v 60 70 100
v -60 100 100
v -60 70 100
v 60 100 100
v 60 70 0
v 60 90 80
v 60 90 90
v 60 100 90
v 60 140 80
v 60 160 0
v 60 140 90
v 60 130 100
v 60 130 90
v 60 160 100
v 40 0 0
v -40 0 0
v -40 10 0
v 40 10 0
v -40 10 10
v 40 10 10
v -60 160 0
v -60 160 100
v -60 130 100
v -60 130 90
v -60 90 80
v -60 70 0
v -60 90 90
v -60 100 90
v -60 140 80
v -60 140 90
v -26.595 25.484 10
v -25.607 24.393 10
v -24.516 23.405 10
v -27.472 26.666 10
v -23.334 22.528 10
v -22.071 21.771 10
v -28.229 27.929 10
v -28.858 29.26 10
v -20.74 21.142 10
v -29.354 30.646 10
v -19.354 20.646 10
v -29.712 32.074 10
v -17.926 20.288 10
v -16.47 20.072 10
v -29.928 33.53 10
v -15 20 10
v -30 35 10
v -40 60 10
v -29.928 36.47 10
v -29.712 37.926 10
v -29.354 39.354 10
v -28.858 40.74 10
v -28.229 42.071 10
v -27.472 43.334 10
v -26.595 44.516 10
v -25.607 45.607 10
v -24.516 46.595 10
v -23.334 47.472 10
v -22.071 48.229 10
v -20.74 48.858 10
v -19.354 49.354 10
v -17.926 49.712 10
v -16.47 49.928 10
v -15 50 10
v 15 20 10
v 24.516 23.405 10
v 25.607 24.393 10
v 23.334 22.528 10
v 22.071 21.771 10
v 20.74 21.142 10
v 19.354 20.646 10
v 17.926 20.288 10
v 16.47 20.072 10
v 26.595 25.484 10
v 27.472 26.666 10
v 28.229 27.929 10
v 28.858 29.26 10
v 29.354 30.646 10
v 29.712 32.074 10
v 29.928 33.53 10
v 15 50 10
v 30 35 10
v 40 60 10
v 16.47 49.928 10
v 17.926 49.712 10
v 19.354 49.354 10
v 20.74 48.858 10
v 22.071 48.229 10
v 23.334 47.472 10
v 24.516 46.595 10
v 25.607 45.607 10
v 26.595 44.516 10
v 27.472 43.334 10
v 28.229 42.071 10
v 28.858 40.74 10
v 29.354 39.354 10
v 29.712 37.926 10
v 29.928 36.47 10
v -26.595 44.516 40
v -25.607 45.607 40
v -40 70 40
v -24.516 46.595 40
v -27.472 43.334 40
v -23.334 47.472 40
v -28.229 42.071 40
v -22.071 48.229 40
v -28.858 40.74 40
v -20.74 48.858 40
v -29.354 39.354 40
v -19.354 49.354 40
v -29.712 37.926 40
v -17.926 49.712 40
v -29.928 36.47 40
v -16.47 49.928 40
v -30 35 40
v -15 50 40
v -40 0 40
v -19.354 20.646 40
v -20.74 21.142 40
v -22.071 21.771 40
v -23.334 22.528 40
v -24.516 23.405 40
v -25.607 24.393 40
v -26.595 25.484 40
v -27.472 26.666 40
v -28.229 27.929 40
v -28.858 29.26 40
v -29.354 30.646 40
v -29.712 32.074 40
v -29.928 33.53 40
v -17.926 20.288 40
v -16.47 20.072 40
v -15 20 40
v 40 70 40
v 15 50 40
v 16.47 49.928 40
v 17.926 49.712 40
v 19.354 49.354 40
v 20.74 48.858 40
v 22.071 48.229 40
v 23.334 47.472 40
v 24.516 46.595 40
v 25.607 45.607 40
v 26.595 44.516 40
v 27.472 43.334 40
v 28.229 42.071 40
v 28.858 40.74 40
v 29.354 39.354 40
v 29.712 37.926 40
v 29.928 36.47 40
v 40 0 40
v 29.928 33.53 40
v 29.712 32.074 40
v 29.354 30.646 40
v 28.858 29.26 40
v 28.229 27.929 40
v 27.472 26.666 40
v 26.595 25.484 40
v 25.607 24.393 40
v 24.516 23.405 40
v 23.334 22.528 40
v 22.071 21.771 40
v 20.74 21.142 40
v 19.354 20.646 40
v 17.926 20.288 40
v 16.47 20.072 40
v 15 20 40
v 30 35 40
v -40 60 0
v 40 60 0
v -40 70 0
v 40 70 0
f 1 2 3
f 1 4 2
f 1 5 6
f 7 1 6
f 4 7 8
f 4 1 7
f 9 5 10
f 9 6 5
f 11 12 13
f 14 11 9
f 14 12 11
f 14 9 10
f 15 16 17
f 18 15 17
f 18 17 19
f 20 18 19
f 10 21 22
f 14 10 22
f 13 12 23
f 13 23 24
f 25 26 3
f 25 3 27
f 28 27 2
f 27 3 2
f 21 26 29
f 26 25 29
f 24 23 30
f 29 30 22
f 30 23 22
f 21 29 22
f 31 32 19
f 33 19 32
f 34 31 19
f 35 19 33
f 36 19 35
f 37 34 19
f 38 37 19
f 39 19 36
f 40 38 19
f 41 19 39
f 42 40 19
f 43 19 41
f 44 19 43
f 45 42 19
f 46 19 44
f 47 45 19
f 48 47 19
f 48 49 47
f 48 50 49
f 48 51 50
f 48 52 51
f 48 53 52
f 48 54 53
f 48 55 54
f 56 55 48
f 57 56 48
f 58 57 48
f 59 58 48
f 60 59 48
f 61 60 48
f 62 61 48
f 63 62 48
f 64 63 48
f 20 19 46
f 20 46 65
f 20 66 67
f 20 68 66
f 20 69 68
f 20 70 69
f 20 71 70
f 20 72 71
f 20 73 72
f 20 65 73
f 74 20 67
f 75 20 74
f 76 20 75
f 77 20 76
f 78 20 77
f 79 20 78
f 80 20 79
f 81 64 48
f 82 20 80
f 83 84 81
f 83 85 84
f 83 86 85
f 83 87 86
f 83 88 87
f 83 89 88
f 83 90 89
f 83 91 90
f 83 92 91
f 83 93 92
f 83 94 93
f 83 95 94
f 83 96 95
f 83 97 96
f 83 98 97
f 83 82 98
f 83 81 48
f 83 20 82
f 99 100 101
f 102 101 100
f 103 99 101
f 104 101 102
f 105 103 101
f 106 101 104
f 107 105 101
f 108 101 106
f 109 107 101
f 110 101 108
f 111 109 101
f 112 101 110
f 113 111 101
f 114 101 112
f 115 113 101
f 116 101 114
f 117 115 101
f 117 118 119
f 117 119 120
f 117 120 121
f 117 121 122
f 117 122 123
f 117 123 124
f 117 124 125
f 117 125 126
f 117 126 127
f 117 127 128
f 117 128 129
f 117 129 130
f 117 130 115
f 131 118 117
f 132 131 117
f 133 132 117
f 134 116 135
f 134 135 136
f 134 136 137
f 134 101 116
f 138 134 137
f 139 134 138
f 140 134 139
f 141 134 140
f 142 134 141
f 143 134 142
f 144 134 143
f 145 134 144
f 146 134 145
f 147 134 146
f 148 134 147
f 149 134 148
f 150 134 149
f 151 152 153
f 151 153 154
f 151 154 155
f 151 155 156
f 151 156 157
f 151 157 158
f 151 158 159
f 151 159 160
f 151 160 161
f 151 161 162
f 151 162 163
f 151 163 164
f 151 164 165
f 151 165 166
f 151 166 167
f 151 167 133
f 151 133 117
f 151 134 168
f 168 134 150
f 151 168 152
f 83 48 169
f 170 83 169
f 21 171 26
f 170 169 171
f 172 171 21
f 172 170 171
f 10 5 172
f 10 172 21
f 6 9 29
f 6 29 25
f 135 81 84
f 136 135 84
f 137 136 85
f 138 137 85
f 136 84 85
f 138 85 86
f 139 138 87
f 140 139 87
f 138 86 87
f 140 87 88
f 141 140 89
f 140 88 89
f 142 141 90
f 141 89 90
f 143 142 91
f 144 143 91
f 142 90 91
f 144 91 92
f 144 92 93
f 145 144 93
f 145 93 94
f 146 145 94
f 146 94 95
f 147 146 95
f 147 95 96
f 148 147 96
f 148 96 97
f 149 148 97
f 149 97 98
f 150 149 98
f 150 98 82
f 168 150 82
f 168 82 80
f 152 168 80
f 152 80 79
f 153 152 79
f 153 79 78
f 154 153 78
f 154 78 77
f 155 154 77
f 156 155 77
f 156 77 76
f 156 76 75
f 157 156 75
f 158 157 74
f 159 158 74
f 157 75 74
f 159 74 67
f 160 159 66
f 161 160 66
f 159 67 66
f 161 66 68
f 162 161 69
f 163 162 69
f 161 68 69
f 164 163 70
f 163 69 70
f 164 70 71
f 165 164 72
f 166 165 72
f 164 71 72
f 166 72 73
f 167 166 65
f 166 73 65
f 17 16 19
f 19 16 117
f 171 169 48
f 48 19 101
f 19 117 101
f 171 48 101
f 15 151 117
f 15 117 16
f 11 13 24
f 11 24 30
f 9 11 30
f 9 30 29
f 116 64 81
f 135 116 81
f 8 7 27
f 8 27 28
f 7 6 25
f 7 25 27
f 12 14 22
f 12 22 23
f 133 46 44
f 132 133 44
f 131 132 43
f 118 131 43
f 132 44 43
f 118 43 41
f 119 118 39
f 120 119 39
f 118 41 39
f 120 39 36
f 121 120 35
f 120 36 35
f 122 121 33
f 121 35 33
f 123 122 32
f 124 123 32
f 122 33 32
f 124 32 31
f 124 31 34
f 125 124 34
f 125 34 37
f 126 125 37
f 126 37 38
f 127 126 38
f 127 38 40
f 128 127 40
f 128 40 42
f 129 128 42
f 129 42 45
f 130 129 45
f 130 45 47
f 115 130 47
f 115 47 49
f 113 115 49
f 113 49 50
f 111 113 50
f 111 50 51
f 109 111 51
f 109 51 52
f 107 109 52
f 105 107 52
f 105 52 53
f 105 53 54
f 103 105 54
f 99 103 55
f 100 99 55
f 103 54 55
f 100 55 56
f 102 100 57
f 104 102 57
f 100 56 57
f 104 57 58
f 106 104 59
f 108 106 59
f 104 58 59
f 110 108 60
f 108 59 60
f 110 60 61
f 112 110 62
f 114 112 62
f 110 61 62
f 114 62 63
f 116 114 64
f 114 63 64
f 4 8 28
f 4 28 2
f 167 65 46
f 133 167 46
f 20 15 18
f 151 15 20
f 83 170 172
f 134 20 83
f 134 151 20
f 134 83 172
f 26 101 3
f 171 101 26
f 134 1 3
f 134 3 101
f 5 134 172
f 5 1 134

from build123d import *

# Parameters (mm, degrees)
BOSS_EXTRUDE1_DEPTH     = 60
BOSS_EXTRUDE2_DEPTH     = 40
CUT_EXTRUDE1_DEPTH      = 182.107702763
CUT_EXTRUDE1_DEPTH_BACK = 182.107702763


with BuildPart() as part:
    # Sketch1 → Boss-Extrude1 (new, symmetric)
    with BuildSketch(Plane.YZ):
        Polygon((70, 100), (70, 40), (70, 0), (160, 0), (160, 100), (130, 100), (130, 90), (140, 90), (140, 80), (90, 80), (90, 90), (100, 90), (100, 100), align=None)
    extrude(amount=BOSS_EXTRUDE1_DEPTH, both=True)

    # Sketch1<3> → Boss-Extrude2 (add, symmetric)
    with BuildSketch(Plane.YZ):
        Polygon((0, 40), (0, 0), (10, 0), (10, 10), (60, 10), (60, 0), (70, 0), (70, 40), align=None)
    extrude(amount=BOSS_EXTRUDE2_DEPTH, both=True)

    # Sketch2 → Cut-Extrude1 (cut, two sides: drawn at the far end of the back side and taken through both)
    with BuildSketch(Plane.XY.offset(40).offset(-CUT_EXTRUDE1_DEPTH_BACK)):
        with BuildLine():
            Line((-15, 50), (15, 50))
            ThreePointArc((15, 50), (30, 35), (15, 20))
            Line((15, 20), (-15, 20))
            ThreePointArc((-15, 20), (-30, 35), (-15, 50))
        make_face()
    extrude(amount=CUT_EXTRUDE1_DEPTH + CUT_EXTRUDE1_DEPTH_BACK, mode=Mode.SUBTRACT)


solid = part.part
